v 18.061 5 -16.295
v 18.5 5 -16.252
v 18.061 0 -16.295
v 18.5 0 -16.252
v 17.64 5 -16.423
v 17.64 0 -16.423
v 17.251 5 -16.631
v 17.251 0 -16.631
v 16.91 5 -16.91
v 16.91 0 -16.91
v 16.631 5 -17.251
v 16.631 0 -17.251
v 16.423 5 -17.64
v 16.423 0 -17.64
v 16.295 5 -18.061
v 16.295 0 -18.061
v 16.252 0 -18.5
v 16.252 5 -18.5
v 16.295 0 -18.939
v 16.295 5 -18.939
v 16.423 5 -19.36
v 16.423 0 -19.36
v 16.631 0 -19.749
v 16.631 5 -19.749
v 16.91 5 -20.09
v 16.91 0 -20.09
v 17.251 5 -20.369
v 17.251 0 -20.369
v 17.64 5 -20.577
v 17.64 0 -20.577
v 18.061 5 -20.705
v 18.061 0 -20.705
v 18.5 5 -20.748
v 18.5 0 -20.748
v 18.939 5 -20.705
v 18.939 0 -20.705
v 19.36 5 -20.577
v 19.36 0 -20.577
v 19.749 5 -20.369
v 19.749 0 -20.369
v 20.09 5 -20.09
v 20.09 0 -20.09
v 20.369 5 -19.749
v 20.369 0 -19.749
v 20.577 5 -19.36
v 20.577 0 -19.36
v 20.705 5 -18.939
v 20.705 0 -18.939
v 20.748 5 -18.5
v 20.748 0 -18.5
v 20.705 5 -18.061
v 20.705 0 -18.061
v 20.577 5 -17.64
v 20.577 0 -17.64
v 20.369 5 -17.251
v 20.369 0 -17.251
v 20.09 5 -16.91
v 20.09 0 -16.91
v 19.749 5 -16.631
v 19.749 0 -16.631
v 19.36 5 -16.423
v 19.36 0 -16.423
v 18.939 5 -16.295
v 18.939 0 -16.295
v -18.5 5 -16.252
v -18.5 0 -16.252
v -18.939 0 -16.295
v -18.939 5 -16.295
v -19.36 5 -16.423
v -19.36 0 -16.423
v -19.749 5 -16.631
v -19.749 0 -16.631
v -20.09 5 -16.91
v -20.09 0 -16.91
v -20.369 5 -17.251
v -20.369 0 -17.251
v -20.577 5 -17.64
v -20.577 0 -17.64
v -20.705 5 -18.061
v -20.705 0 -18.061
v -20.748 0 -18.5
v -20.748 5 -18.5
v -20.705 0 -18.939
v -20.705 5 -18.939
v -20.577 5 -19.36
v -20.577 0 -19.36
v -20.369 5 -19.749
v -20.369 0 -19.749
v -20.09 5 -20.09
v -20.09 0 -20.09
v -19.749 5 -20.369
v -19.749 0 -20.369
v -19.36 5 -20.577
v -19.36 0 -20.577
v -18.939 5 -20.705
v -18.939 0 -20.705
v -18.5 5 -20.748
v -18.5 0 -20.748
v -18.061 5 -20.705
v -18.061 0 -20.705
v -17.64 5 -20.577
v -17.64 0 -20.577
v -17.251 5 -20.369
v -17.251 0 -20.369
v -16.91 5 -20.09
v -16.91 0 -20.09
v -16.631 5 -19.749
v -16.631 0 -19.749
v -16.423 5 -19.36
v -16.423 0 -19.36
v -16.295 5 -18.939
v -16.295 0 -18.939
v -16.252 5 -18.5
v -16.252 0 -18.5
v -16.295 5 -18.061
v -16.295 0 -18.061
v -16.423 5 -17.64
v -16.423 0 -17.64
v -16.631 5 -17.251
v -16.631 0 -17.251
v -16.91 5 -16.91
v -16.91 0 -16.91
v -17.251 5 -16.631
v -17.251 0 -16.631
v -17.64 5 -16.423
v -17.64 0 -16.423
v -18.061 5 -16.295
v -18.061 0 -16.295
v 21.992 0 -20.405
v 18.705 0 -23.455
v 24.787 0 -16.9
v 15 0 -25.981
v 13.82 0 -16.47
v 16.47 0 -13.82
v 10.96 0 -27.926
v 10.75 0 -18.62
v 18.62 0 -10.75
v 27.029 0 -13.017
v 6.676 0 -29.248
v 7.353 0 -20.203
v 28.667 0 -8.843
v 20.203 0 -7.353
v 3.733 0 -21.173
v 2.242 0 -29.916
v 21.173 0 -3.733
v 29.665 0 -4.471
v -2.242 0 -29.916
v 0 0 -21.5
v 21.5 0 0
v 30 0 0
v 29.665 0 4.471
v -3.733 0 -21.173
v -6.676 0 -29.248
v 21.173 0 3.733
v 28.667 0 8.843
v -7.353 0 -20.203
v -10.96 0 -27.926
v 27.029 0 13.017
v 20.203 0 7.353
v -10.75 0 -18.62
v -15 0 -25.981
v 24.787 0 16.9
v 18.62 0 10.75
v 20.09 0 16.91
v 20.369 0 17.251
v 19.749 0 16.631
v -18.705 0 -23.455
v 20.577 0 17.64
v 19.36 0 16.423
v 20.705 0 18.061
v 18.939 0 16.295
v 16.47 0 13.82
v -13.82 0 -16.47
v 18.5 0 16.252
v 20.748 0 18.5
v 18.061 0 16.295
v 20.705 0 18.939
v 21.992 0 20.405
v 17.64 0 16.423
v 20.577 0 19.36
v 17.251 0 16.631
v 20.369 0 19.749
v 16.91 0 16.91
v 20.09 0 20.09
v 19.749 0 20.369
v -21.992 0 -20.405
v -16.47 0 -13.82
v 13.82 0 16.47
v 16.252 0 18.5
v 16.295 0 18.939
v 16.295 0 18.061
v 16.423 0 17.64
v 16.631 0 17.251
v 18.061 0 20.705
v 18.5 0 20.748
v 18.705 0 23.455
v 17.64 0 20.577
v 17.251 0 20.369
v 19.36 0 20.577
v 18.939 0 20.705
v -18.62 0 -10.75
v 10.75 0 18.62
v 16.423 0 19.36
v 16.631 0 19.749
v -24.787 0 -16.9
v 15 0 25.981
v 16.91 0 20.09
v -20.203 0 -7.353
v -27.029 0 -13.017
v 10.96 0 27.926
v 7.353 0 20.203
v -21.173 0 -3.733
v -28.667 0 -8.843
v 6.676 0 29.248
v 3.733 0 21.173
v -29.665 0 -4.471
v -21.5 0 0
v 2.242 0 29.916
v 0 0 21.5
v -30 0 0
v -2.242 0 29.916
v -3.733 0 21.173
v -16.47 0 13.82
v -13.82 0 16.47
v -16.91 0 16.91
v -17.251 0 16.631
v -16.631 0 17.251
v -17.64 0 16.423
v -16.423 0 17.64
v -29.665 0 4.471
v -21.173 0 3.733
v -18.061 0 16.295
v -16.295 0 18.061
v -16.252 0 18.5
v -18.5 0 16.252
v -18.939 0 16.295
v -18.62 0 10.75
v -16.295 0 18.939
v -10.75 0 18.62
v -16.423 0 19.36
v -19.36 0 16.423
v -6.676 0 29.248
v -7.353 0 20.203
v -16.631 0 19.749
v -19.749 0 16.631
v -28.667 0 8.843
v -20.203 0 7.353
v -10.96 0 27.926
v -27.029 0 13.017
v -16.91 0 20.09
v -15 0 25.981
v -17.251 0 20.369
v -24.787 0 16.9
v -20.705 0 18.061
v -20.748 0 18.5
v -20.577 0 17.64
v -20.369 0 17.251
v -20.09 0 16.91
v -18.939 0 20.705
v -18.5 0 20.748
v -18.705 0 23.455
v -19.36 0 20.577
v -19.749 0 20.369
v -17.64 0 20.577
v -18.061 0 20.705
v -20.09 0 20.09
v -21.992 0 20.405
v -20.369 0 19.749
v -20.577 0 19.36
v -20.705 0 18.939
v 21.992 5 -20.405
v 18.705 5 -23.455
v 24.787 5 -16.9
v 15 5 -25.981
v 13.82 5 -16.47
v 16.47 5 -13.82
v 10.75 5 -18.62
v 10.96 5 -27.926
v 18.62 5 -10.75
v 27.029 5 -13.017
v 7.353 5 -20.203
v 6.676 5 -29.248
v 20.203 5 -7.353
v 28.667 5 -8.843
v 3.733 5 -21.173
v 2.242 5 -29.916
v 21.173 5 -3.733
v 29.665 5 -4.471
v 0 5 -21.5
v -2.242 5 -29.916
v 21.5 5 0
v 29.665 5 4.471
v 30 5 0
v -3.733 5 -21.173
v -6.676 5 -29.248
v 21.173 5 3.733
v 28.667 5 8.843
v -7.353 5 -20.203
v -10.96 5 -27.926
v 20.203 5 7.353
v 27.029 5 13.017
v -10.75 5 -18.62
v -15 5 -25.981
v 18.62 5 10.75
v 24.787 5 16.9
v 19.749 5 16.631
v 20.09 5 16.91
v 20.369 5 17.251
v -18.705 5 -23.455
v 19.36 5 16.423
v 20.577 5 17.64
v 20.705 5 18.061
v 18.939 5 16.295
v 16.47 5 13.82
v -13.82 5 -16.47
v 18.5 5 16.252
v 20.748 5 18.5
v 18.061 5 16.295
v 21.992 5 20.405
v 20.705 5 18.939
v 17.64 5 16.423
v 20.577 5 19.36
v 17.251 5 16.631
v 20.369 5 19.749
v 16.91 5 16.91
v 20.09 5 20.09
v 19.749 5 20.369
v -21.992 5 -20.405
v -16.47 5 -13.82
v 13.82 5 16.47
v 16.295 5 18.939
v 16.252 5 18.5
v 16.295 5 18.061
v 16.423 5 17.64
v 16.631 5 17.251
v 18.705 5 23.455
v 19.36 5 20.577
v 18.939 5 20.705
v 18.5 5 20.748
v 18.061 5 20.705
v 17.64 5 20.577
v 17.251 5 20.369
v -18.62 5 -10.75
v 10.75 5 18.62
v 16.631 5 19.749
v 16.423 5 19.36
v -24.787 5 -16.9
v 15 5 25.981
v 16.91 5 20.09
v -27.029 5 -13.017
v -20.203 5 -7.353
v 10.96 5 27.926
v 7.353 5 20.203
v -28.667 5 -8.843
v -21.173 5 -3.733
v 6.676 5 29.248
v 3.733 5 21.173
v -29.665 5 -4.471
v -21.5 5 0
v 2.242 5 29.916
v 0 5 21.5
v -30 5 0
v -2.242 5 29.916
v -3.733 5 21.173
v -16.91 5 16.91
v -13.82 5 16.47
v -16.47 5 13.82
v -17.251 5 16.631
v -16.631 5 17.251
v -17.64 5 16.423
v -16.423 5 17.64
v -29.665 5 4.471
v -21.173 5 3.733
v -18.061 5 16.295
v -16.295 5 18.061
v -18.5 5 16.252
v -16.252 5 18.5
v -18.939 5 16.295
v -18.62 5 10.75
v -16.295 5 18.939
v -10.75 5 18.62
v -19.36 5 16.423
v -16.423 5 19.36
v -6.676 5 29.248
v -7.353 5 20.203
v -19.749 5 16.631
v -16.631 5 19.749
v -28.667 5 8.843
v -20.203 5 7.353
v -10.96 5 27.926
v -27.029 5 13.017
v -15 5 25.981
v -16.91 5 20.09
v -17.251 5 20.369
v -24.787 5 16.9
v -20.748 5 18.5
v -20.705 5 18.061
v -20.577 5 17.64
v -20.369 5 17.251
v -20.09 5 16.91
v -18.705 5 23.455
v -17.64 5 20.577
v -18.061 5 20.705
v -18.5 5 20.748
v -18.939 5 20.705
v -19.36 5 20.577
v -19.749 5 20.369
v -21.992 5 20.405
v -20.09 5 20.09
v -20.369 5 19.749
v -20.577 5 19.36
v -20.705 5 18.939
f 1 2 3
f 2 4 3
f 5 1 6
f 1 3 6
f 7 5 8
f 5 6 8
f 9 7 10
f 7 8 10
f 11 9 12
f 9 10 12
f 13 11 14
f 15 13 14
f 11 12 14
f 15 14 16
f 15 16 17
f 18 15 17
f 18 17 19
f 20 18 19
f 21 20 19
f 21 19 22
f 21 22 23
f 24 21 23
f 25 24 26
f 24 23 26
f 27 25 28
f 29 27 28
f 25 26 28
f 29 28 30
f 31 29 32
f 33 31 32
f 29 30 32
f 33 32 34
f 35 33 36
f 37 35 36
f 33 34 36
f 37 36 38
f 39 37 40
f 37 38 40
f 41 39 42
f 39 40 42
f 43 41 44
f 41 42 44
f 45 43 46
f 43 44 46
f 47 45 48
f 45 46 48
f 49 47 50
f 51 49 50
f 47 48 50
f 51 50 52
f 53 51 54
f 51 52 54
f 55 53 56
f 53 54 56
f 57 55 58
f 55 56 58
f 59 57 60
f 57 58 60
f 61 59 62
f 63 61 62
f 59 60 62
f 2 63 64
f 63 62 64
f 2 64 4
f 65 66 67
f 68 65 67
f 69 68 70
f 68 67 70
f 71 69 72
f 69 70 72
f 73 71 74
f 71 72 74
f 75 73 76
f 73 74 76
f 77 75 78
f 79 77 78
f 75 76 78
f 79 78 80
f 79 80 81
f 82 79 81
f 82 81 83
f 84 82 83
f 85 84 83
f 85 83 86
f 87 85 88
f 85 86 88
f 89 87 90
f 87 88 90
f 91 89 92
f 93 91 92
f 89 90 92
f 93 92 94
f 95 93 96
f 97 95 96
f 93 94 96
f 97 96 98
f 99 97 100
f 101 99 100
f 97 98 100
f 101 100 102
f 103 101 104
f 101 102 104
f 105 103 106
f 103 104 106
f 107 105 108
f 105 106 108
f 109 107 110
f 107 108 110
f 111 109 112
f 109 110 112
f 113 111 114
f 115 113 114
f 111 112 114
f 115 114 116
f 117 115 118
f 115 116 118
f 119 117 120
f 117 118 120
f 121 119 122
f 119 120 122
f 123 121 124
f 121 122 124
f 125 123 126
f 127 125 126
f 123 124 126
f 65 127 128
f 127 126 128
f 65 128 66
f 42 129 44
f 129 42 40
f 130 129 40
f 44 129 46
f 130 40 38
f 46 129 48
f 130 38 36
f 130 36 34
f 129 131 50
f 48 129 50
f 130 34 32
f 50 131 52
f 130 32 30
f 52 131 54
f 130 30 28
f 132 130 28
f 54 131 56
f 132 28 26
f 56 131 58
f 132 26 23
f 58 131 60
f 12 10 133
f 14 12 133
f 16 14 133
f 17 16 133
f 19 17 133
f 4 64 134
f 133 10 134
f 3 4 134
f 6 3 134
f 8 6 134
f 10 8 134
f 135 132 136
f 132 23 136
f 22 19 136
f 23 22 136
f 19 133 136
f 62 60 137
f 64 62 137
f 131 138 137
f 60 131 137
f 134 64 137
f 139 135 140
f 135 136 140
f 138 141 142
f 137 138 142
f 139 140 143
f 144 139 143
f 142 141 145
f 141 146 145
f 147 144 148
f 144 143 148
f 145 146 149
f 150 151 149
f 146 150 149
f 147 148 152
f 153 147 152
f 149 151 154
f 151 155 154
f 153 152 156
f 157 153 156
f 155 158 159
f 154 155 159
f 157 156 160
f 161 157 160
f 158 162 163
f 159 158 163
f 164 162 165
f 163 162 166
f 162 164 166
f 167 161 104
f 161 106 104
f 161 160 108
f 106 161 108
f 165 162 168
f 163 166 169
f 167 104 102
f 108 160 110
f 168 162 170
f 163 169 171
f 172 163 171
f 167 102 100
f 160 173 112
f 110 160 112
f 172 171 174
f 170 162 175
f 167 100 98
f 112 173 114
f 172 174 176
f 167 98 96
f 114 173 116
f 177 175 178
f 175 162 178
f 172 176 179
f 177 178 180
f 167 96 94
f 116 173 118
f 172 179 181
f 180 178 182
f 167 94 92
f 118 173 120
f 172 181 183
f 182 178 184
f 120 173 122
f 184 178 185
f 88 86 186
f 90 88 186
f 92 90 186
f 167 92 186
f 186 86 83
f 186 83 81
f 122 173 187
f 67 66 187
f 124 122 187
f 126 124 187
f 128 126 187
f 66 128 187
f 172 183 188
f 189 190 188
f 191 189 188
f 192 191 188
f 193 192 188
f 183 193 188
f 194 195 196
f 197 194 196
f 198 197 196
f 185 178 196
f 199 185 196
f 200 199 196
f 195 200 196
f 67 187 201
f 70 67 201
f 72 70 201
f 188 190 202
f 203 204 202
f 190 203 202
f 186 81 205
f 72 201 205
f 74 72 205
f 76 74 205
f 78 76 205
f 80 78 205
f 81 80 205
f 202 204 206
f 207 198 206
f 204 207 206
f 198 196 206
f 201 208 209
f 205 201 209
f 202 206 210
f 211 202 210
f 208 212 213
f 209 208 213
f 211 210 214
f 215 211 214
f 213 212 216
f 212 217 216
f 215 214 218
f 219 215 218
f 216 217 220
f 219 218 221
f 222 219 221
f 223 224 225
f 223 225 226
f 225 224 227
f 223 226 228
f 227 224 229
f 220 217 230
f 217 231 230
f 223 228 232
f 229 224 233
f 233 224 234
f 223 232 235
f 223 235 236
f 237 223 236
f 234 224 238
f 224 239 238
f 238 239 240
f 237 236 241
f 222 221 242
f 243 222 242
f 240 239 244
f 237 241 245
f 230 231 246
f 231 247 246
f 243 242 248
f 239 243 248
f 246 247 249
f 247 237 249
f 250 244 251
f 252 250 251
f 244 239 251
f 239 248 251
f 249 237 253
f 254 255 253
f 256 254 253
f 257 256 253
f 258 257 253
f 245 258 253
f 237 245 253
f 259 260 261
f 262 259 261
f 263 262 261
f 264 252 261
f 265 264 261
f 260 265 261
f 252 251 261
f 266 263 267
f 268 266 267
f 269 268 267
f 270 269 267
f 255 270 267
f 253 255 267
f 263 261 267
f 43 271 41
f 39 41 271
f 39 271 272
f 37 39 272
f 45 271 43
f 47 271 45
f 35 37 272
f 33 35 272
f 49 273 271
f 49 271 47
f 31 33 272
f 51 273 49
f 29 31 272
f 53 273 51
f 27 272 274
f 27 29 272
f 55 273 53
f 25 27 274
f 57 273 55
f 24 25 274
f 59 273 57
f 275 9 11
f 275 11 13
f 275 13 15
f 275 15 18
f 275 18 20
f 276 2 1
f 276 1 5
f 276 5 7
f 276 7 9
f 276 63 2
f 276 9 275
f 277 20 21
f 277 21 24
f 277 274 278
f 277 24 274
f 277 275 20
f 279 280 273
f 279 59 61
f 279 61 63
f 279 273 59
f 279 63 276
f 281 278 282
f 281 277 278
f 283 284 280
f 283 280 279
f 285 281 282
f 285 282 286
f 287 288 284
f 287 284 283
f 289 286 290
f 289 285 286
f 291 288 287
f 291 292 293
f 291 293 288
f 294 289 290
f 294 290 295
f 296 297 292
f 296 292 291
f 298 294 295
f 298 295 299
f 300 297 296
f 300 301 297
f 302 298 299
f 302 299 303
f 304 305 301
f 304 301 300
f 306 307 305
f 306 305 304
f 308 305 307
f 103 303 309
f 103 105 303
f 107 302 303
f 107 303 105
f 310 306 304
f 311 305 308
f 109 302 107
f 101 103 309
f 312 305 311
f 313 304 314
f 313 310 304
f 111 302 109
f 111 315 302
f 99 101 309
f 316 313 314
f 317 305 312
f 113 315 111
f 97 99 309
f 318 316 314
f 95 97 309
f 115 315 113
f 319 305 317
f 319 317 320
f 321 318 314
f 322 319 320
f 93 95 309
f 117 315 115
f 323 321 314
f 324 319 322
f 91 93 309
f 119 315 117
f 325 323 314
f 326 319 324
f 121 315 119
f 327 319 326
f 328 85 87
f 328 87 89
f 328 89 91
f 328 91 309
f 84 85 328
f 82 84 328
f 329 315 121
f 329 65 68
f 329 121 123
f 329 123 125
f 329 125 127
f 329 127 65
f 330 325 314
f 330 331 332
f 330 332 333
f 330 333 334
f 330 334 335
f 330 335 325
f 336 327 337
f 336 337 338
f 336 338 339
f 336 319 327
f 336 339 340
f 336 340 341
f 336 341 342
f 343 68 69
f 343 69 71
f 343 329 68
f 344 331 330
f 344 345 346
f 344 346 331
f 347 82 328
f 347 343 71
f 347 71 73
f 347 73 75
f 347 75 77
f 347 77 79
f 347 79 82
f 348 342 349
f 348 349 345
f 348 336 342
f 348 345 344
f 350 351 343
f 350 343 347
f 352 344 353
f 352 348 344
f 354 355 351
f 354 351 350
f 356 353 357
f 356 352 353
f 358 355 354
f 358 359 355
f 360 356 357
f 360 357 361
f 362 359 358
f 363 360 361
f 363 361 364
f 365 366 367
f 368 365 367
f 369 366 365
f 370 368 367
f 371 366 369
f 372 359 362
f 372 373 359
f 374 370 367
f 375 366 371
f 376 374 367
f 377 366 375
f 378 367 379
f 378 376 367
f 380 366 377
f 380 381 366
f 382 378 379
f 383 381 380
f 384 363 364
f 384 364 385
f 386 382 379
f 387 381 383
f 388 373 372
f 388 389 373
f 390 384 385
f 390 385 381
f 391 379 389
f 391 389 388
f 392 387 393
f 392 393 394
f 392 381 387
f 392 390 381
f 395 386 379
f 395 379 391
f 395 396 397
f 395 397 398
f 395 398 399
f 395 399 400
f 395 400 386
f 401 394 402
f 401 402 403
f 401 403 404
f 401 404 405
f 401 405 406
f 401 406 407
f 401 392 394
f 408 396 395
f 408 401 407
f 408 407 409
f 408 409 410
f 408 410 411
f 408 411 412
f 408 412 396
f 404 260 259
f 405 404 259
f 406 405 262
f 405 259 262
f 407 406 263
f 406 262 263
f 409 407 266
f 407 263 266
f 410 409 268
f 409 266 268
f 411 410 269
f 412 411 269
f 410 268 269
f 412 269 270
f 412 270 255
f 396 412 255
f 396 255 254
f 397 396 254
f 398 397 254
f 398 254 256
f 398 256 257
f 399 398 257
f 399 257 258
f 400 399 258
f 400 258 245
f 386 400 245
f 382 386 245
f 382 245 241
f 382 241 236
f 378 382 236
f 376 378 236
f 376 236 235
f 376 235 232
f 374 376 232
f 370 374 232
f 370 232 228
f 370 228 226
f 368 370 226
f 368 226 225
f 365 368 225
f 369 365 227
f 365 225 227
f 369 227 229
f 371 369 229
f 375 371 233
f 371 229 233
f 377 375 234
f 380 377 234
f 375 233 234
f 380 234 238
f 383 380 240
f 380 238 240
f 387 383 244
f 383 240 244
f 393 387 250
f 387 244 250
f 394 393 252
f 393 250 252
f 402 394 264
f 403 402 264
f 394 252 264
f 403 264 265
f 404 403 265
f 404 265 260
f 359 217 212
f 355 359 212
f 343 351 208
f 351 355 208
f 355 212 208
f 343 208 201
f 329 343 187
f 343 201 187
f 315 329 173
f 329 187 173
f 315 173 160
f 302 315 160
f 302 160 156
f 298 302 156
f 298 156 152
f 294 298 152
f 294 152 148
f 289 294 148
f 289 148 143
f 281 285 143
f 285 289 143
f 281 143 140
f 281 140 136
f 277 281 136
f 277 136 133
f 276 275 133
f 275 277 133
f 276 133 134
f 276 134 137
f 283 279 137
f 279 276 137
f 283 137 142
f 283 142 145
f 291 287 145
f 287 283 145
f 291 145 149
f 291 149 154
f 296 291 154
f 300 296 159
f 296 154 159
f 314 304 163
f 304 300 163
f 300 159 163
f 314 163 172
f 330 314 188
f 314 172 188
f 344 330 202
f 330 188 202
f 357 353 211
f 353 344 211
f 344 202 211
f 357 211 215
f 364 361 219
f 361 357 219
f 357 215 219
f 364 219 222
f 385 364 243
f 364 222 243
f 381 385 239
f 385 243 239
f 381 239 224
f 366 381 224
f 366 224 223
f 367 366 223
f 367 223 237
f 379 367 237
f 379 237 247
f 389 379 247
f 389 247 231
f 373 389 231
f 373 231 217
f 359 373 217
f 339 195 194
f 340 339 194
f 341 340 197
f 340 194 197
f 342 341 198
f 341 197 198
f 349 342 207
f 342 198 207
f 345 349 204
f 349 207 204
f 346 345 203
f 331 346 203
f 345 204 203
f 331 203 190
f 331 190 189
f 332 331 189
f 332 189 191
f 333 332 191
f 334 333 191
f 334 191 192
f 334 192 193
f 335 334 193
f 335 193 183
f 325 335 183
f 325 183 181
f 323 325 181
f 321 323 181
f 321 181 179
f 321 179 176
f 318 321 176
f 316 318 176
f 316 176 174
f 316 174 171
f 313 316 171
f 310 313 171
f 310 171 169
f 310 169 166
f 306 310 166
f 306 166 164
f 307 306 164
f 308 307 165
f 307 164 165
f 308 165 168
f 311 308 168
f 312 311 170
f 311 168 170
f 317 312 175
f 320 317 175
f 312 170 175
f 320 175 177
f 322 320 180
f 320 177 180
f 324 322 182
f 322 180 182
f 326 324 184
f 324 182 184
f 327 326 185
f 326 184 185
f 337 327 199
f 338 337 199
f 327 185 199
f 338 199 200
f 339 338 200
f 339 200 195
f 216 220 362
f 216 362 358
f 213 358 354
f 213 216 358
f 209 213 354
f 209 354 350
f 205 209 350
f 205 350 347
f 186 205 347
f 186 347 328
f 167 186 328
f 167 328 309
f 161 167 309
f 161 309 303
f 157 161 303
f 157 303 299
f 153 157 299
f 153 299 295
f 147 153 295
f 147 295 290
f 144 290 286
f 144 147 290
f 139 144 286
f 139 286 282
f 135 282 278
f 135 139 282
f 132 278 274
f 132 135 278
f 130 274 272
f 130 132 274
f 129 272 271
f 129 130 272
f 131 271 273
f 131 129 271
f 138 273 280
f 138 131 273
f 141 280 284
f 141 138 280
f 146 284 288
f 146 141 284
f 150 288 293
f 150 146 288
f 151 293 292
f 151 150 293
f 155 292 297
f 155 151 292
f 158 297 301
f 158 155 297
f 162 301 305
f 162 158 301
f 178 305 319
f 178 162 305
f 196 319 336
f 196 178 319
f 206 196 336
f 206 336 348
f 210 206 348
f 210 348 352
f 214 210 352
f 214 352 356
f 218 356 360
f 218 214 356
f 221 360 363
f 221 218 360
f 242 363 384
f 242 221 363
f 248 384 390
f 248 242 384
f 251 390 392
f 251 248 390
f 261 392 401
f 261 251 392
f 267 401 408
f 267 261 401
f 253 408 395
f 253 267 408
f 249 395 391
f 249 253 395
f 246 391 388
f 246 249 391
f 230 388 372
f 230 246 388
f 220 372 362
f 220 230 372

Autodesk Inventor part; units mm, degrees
ref_plane "YZ Plane" through (0, 0, 0) normal (1, 0, 0) x (0, 1, 0)
ref_plane "XZ Plane" through (0, 0, 0) normal (0, 1, 0) x (-1, 0, 0)
ref_plane "XY Plane" through (0, 0, 0) normal (0, 0, 1) x (1, 0, 0)
sketch "Sketch1" plane through (0, 0, 0) normal (0, 1, 0) x (-1, 0, 0)
  circle A0 centre (0, 0) radius 21.5
  circle A1 centre (0, 0) radius 30
  dimension "d0" = 43
  dimension "d1" = 60
extrude "Extrusion1" add sketch "Sketch1" along normal blind 5
sketch "Sketch2" plane through (0, 5, 0) normal (0, 1, 0) x (1, 0, 0)
  line L0 (18.5, -18.5) -> (-18.5, -18.5)
  line L1 (-18.5, -18.5) -> (-18.5, 18.5)
  line L2 (-18.5, 18.5) -> (18.5, 18.5)
  line L3 (18.5, 18.5) -> (18.5, -18.5)
  circle A0 centre (0, 0) radius 30 projected
  line L4 (18.5, -18.5) -> (-18.5, 18.5) construction
  line L5 (-18.5, -18.5) -> (18.5, 18.5) construction
  dimension "d4" = 37
  dimension "d5" = 37
hole "Hole1" at (-18.5, 5, 18.5) at (-18.5, 5, -18.5) at (18.5, 5, -18.5) at (18.5, 5, 18.5) direction (0, -1, 0) diameter 4.496 depth 6 clearance for "Flat Head Machine Screw (82)" size "#8" standard "Ansi Unified Screw Threads"
properties part number "immersion_chamber_plate"
